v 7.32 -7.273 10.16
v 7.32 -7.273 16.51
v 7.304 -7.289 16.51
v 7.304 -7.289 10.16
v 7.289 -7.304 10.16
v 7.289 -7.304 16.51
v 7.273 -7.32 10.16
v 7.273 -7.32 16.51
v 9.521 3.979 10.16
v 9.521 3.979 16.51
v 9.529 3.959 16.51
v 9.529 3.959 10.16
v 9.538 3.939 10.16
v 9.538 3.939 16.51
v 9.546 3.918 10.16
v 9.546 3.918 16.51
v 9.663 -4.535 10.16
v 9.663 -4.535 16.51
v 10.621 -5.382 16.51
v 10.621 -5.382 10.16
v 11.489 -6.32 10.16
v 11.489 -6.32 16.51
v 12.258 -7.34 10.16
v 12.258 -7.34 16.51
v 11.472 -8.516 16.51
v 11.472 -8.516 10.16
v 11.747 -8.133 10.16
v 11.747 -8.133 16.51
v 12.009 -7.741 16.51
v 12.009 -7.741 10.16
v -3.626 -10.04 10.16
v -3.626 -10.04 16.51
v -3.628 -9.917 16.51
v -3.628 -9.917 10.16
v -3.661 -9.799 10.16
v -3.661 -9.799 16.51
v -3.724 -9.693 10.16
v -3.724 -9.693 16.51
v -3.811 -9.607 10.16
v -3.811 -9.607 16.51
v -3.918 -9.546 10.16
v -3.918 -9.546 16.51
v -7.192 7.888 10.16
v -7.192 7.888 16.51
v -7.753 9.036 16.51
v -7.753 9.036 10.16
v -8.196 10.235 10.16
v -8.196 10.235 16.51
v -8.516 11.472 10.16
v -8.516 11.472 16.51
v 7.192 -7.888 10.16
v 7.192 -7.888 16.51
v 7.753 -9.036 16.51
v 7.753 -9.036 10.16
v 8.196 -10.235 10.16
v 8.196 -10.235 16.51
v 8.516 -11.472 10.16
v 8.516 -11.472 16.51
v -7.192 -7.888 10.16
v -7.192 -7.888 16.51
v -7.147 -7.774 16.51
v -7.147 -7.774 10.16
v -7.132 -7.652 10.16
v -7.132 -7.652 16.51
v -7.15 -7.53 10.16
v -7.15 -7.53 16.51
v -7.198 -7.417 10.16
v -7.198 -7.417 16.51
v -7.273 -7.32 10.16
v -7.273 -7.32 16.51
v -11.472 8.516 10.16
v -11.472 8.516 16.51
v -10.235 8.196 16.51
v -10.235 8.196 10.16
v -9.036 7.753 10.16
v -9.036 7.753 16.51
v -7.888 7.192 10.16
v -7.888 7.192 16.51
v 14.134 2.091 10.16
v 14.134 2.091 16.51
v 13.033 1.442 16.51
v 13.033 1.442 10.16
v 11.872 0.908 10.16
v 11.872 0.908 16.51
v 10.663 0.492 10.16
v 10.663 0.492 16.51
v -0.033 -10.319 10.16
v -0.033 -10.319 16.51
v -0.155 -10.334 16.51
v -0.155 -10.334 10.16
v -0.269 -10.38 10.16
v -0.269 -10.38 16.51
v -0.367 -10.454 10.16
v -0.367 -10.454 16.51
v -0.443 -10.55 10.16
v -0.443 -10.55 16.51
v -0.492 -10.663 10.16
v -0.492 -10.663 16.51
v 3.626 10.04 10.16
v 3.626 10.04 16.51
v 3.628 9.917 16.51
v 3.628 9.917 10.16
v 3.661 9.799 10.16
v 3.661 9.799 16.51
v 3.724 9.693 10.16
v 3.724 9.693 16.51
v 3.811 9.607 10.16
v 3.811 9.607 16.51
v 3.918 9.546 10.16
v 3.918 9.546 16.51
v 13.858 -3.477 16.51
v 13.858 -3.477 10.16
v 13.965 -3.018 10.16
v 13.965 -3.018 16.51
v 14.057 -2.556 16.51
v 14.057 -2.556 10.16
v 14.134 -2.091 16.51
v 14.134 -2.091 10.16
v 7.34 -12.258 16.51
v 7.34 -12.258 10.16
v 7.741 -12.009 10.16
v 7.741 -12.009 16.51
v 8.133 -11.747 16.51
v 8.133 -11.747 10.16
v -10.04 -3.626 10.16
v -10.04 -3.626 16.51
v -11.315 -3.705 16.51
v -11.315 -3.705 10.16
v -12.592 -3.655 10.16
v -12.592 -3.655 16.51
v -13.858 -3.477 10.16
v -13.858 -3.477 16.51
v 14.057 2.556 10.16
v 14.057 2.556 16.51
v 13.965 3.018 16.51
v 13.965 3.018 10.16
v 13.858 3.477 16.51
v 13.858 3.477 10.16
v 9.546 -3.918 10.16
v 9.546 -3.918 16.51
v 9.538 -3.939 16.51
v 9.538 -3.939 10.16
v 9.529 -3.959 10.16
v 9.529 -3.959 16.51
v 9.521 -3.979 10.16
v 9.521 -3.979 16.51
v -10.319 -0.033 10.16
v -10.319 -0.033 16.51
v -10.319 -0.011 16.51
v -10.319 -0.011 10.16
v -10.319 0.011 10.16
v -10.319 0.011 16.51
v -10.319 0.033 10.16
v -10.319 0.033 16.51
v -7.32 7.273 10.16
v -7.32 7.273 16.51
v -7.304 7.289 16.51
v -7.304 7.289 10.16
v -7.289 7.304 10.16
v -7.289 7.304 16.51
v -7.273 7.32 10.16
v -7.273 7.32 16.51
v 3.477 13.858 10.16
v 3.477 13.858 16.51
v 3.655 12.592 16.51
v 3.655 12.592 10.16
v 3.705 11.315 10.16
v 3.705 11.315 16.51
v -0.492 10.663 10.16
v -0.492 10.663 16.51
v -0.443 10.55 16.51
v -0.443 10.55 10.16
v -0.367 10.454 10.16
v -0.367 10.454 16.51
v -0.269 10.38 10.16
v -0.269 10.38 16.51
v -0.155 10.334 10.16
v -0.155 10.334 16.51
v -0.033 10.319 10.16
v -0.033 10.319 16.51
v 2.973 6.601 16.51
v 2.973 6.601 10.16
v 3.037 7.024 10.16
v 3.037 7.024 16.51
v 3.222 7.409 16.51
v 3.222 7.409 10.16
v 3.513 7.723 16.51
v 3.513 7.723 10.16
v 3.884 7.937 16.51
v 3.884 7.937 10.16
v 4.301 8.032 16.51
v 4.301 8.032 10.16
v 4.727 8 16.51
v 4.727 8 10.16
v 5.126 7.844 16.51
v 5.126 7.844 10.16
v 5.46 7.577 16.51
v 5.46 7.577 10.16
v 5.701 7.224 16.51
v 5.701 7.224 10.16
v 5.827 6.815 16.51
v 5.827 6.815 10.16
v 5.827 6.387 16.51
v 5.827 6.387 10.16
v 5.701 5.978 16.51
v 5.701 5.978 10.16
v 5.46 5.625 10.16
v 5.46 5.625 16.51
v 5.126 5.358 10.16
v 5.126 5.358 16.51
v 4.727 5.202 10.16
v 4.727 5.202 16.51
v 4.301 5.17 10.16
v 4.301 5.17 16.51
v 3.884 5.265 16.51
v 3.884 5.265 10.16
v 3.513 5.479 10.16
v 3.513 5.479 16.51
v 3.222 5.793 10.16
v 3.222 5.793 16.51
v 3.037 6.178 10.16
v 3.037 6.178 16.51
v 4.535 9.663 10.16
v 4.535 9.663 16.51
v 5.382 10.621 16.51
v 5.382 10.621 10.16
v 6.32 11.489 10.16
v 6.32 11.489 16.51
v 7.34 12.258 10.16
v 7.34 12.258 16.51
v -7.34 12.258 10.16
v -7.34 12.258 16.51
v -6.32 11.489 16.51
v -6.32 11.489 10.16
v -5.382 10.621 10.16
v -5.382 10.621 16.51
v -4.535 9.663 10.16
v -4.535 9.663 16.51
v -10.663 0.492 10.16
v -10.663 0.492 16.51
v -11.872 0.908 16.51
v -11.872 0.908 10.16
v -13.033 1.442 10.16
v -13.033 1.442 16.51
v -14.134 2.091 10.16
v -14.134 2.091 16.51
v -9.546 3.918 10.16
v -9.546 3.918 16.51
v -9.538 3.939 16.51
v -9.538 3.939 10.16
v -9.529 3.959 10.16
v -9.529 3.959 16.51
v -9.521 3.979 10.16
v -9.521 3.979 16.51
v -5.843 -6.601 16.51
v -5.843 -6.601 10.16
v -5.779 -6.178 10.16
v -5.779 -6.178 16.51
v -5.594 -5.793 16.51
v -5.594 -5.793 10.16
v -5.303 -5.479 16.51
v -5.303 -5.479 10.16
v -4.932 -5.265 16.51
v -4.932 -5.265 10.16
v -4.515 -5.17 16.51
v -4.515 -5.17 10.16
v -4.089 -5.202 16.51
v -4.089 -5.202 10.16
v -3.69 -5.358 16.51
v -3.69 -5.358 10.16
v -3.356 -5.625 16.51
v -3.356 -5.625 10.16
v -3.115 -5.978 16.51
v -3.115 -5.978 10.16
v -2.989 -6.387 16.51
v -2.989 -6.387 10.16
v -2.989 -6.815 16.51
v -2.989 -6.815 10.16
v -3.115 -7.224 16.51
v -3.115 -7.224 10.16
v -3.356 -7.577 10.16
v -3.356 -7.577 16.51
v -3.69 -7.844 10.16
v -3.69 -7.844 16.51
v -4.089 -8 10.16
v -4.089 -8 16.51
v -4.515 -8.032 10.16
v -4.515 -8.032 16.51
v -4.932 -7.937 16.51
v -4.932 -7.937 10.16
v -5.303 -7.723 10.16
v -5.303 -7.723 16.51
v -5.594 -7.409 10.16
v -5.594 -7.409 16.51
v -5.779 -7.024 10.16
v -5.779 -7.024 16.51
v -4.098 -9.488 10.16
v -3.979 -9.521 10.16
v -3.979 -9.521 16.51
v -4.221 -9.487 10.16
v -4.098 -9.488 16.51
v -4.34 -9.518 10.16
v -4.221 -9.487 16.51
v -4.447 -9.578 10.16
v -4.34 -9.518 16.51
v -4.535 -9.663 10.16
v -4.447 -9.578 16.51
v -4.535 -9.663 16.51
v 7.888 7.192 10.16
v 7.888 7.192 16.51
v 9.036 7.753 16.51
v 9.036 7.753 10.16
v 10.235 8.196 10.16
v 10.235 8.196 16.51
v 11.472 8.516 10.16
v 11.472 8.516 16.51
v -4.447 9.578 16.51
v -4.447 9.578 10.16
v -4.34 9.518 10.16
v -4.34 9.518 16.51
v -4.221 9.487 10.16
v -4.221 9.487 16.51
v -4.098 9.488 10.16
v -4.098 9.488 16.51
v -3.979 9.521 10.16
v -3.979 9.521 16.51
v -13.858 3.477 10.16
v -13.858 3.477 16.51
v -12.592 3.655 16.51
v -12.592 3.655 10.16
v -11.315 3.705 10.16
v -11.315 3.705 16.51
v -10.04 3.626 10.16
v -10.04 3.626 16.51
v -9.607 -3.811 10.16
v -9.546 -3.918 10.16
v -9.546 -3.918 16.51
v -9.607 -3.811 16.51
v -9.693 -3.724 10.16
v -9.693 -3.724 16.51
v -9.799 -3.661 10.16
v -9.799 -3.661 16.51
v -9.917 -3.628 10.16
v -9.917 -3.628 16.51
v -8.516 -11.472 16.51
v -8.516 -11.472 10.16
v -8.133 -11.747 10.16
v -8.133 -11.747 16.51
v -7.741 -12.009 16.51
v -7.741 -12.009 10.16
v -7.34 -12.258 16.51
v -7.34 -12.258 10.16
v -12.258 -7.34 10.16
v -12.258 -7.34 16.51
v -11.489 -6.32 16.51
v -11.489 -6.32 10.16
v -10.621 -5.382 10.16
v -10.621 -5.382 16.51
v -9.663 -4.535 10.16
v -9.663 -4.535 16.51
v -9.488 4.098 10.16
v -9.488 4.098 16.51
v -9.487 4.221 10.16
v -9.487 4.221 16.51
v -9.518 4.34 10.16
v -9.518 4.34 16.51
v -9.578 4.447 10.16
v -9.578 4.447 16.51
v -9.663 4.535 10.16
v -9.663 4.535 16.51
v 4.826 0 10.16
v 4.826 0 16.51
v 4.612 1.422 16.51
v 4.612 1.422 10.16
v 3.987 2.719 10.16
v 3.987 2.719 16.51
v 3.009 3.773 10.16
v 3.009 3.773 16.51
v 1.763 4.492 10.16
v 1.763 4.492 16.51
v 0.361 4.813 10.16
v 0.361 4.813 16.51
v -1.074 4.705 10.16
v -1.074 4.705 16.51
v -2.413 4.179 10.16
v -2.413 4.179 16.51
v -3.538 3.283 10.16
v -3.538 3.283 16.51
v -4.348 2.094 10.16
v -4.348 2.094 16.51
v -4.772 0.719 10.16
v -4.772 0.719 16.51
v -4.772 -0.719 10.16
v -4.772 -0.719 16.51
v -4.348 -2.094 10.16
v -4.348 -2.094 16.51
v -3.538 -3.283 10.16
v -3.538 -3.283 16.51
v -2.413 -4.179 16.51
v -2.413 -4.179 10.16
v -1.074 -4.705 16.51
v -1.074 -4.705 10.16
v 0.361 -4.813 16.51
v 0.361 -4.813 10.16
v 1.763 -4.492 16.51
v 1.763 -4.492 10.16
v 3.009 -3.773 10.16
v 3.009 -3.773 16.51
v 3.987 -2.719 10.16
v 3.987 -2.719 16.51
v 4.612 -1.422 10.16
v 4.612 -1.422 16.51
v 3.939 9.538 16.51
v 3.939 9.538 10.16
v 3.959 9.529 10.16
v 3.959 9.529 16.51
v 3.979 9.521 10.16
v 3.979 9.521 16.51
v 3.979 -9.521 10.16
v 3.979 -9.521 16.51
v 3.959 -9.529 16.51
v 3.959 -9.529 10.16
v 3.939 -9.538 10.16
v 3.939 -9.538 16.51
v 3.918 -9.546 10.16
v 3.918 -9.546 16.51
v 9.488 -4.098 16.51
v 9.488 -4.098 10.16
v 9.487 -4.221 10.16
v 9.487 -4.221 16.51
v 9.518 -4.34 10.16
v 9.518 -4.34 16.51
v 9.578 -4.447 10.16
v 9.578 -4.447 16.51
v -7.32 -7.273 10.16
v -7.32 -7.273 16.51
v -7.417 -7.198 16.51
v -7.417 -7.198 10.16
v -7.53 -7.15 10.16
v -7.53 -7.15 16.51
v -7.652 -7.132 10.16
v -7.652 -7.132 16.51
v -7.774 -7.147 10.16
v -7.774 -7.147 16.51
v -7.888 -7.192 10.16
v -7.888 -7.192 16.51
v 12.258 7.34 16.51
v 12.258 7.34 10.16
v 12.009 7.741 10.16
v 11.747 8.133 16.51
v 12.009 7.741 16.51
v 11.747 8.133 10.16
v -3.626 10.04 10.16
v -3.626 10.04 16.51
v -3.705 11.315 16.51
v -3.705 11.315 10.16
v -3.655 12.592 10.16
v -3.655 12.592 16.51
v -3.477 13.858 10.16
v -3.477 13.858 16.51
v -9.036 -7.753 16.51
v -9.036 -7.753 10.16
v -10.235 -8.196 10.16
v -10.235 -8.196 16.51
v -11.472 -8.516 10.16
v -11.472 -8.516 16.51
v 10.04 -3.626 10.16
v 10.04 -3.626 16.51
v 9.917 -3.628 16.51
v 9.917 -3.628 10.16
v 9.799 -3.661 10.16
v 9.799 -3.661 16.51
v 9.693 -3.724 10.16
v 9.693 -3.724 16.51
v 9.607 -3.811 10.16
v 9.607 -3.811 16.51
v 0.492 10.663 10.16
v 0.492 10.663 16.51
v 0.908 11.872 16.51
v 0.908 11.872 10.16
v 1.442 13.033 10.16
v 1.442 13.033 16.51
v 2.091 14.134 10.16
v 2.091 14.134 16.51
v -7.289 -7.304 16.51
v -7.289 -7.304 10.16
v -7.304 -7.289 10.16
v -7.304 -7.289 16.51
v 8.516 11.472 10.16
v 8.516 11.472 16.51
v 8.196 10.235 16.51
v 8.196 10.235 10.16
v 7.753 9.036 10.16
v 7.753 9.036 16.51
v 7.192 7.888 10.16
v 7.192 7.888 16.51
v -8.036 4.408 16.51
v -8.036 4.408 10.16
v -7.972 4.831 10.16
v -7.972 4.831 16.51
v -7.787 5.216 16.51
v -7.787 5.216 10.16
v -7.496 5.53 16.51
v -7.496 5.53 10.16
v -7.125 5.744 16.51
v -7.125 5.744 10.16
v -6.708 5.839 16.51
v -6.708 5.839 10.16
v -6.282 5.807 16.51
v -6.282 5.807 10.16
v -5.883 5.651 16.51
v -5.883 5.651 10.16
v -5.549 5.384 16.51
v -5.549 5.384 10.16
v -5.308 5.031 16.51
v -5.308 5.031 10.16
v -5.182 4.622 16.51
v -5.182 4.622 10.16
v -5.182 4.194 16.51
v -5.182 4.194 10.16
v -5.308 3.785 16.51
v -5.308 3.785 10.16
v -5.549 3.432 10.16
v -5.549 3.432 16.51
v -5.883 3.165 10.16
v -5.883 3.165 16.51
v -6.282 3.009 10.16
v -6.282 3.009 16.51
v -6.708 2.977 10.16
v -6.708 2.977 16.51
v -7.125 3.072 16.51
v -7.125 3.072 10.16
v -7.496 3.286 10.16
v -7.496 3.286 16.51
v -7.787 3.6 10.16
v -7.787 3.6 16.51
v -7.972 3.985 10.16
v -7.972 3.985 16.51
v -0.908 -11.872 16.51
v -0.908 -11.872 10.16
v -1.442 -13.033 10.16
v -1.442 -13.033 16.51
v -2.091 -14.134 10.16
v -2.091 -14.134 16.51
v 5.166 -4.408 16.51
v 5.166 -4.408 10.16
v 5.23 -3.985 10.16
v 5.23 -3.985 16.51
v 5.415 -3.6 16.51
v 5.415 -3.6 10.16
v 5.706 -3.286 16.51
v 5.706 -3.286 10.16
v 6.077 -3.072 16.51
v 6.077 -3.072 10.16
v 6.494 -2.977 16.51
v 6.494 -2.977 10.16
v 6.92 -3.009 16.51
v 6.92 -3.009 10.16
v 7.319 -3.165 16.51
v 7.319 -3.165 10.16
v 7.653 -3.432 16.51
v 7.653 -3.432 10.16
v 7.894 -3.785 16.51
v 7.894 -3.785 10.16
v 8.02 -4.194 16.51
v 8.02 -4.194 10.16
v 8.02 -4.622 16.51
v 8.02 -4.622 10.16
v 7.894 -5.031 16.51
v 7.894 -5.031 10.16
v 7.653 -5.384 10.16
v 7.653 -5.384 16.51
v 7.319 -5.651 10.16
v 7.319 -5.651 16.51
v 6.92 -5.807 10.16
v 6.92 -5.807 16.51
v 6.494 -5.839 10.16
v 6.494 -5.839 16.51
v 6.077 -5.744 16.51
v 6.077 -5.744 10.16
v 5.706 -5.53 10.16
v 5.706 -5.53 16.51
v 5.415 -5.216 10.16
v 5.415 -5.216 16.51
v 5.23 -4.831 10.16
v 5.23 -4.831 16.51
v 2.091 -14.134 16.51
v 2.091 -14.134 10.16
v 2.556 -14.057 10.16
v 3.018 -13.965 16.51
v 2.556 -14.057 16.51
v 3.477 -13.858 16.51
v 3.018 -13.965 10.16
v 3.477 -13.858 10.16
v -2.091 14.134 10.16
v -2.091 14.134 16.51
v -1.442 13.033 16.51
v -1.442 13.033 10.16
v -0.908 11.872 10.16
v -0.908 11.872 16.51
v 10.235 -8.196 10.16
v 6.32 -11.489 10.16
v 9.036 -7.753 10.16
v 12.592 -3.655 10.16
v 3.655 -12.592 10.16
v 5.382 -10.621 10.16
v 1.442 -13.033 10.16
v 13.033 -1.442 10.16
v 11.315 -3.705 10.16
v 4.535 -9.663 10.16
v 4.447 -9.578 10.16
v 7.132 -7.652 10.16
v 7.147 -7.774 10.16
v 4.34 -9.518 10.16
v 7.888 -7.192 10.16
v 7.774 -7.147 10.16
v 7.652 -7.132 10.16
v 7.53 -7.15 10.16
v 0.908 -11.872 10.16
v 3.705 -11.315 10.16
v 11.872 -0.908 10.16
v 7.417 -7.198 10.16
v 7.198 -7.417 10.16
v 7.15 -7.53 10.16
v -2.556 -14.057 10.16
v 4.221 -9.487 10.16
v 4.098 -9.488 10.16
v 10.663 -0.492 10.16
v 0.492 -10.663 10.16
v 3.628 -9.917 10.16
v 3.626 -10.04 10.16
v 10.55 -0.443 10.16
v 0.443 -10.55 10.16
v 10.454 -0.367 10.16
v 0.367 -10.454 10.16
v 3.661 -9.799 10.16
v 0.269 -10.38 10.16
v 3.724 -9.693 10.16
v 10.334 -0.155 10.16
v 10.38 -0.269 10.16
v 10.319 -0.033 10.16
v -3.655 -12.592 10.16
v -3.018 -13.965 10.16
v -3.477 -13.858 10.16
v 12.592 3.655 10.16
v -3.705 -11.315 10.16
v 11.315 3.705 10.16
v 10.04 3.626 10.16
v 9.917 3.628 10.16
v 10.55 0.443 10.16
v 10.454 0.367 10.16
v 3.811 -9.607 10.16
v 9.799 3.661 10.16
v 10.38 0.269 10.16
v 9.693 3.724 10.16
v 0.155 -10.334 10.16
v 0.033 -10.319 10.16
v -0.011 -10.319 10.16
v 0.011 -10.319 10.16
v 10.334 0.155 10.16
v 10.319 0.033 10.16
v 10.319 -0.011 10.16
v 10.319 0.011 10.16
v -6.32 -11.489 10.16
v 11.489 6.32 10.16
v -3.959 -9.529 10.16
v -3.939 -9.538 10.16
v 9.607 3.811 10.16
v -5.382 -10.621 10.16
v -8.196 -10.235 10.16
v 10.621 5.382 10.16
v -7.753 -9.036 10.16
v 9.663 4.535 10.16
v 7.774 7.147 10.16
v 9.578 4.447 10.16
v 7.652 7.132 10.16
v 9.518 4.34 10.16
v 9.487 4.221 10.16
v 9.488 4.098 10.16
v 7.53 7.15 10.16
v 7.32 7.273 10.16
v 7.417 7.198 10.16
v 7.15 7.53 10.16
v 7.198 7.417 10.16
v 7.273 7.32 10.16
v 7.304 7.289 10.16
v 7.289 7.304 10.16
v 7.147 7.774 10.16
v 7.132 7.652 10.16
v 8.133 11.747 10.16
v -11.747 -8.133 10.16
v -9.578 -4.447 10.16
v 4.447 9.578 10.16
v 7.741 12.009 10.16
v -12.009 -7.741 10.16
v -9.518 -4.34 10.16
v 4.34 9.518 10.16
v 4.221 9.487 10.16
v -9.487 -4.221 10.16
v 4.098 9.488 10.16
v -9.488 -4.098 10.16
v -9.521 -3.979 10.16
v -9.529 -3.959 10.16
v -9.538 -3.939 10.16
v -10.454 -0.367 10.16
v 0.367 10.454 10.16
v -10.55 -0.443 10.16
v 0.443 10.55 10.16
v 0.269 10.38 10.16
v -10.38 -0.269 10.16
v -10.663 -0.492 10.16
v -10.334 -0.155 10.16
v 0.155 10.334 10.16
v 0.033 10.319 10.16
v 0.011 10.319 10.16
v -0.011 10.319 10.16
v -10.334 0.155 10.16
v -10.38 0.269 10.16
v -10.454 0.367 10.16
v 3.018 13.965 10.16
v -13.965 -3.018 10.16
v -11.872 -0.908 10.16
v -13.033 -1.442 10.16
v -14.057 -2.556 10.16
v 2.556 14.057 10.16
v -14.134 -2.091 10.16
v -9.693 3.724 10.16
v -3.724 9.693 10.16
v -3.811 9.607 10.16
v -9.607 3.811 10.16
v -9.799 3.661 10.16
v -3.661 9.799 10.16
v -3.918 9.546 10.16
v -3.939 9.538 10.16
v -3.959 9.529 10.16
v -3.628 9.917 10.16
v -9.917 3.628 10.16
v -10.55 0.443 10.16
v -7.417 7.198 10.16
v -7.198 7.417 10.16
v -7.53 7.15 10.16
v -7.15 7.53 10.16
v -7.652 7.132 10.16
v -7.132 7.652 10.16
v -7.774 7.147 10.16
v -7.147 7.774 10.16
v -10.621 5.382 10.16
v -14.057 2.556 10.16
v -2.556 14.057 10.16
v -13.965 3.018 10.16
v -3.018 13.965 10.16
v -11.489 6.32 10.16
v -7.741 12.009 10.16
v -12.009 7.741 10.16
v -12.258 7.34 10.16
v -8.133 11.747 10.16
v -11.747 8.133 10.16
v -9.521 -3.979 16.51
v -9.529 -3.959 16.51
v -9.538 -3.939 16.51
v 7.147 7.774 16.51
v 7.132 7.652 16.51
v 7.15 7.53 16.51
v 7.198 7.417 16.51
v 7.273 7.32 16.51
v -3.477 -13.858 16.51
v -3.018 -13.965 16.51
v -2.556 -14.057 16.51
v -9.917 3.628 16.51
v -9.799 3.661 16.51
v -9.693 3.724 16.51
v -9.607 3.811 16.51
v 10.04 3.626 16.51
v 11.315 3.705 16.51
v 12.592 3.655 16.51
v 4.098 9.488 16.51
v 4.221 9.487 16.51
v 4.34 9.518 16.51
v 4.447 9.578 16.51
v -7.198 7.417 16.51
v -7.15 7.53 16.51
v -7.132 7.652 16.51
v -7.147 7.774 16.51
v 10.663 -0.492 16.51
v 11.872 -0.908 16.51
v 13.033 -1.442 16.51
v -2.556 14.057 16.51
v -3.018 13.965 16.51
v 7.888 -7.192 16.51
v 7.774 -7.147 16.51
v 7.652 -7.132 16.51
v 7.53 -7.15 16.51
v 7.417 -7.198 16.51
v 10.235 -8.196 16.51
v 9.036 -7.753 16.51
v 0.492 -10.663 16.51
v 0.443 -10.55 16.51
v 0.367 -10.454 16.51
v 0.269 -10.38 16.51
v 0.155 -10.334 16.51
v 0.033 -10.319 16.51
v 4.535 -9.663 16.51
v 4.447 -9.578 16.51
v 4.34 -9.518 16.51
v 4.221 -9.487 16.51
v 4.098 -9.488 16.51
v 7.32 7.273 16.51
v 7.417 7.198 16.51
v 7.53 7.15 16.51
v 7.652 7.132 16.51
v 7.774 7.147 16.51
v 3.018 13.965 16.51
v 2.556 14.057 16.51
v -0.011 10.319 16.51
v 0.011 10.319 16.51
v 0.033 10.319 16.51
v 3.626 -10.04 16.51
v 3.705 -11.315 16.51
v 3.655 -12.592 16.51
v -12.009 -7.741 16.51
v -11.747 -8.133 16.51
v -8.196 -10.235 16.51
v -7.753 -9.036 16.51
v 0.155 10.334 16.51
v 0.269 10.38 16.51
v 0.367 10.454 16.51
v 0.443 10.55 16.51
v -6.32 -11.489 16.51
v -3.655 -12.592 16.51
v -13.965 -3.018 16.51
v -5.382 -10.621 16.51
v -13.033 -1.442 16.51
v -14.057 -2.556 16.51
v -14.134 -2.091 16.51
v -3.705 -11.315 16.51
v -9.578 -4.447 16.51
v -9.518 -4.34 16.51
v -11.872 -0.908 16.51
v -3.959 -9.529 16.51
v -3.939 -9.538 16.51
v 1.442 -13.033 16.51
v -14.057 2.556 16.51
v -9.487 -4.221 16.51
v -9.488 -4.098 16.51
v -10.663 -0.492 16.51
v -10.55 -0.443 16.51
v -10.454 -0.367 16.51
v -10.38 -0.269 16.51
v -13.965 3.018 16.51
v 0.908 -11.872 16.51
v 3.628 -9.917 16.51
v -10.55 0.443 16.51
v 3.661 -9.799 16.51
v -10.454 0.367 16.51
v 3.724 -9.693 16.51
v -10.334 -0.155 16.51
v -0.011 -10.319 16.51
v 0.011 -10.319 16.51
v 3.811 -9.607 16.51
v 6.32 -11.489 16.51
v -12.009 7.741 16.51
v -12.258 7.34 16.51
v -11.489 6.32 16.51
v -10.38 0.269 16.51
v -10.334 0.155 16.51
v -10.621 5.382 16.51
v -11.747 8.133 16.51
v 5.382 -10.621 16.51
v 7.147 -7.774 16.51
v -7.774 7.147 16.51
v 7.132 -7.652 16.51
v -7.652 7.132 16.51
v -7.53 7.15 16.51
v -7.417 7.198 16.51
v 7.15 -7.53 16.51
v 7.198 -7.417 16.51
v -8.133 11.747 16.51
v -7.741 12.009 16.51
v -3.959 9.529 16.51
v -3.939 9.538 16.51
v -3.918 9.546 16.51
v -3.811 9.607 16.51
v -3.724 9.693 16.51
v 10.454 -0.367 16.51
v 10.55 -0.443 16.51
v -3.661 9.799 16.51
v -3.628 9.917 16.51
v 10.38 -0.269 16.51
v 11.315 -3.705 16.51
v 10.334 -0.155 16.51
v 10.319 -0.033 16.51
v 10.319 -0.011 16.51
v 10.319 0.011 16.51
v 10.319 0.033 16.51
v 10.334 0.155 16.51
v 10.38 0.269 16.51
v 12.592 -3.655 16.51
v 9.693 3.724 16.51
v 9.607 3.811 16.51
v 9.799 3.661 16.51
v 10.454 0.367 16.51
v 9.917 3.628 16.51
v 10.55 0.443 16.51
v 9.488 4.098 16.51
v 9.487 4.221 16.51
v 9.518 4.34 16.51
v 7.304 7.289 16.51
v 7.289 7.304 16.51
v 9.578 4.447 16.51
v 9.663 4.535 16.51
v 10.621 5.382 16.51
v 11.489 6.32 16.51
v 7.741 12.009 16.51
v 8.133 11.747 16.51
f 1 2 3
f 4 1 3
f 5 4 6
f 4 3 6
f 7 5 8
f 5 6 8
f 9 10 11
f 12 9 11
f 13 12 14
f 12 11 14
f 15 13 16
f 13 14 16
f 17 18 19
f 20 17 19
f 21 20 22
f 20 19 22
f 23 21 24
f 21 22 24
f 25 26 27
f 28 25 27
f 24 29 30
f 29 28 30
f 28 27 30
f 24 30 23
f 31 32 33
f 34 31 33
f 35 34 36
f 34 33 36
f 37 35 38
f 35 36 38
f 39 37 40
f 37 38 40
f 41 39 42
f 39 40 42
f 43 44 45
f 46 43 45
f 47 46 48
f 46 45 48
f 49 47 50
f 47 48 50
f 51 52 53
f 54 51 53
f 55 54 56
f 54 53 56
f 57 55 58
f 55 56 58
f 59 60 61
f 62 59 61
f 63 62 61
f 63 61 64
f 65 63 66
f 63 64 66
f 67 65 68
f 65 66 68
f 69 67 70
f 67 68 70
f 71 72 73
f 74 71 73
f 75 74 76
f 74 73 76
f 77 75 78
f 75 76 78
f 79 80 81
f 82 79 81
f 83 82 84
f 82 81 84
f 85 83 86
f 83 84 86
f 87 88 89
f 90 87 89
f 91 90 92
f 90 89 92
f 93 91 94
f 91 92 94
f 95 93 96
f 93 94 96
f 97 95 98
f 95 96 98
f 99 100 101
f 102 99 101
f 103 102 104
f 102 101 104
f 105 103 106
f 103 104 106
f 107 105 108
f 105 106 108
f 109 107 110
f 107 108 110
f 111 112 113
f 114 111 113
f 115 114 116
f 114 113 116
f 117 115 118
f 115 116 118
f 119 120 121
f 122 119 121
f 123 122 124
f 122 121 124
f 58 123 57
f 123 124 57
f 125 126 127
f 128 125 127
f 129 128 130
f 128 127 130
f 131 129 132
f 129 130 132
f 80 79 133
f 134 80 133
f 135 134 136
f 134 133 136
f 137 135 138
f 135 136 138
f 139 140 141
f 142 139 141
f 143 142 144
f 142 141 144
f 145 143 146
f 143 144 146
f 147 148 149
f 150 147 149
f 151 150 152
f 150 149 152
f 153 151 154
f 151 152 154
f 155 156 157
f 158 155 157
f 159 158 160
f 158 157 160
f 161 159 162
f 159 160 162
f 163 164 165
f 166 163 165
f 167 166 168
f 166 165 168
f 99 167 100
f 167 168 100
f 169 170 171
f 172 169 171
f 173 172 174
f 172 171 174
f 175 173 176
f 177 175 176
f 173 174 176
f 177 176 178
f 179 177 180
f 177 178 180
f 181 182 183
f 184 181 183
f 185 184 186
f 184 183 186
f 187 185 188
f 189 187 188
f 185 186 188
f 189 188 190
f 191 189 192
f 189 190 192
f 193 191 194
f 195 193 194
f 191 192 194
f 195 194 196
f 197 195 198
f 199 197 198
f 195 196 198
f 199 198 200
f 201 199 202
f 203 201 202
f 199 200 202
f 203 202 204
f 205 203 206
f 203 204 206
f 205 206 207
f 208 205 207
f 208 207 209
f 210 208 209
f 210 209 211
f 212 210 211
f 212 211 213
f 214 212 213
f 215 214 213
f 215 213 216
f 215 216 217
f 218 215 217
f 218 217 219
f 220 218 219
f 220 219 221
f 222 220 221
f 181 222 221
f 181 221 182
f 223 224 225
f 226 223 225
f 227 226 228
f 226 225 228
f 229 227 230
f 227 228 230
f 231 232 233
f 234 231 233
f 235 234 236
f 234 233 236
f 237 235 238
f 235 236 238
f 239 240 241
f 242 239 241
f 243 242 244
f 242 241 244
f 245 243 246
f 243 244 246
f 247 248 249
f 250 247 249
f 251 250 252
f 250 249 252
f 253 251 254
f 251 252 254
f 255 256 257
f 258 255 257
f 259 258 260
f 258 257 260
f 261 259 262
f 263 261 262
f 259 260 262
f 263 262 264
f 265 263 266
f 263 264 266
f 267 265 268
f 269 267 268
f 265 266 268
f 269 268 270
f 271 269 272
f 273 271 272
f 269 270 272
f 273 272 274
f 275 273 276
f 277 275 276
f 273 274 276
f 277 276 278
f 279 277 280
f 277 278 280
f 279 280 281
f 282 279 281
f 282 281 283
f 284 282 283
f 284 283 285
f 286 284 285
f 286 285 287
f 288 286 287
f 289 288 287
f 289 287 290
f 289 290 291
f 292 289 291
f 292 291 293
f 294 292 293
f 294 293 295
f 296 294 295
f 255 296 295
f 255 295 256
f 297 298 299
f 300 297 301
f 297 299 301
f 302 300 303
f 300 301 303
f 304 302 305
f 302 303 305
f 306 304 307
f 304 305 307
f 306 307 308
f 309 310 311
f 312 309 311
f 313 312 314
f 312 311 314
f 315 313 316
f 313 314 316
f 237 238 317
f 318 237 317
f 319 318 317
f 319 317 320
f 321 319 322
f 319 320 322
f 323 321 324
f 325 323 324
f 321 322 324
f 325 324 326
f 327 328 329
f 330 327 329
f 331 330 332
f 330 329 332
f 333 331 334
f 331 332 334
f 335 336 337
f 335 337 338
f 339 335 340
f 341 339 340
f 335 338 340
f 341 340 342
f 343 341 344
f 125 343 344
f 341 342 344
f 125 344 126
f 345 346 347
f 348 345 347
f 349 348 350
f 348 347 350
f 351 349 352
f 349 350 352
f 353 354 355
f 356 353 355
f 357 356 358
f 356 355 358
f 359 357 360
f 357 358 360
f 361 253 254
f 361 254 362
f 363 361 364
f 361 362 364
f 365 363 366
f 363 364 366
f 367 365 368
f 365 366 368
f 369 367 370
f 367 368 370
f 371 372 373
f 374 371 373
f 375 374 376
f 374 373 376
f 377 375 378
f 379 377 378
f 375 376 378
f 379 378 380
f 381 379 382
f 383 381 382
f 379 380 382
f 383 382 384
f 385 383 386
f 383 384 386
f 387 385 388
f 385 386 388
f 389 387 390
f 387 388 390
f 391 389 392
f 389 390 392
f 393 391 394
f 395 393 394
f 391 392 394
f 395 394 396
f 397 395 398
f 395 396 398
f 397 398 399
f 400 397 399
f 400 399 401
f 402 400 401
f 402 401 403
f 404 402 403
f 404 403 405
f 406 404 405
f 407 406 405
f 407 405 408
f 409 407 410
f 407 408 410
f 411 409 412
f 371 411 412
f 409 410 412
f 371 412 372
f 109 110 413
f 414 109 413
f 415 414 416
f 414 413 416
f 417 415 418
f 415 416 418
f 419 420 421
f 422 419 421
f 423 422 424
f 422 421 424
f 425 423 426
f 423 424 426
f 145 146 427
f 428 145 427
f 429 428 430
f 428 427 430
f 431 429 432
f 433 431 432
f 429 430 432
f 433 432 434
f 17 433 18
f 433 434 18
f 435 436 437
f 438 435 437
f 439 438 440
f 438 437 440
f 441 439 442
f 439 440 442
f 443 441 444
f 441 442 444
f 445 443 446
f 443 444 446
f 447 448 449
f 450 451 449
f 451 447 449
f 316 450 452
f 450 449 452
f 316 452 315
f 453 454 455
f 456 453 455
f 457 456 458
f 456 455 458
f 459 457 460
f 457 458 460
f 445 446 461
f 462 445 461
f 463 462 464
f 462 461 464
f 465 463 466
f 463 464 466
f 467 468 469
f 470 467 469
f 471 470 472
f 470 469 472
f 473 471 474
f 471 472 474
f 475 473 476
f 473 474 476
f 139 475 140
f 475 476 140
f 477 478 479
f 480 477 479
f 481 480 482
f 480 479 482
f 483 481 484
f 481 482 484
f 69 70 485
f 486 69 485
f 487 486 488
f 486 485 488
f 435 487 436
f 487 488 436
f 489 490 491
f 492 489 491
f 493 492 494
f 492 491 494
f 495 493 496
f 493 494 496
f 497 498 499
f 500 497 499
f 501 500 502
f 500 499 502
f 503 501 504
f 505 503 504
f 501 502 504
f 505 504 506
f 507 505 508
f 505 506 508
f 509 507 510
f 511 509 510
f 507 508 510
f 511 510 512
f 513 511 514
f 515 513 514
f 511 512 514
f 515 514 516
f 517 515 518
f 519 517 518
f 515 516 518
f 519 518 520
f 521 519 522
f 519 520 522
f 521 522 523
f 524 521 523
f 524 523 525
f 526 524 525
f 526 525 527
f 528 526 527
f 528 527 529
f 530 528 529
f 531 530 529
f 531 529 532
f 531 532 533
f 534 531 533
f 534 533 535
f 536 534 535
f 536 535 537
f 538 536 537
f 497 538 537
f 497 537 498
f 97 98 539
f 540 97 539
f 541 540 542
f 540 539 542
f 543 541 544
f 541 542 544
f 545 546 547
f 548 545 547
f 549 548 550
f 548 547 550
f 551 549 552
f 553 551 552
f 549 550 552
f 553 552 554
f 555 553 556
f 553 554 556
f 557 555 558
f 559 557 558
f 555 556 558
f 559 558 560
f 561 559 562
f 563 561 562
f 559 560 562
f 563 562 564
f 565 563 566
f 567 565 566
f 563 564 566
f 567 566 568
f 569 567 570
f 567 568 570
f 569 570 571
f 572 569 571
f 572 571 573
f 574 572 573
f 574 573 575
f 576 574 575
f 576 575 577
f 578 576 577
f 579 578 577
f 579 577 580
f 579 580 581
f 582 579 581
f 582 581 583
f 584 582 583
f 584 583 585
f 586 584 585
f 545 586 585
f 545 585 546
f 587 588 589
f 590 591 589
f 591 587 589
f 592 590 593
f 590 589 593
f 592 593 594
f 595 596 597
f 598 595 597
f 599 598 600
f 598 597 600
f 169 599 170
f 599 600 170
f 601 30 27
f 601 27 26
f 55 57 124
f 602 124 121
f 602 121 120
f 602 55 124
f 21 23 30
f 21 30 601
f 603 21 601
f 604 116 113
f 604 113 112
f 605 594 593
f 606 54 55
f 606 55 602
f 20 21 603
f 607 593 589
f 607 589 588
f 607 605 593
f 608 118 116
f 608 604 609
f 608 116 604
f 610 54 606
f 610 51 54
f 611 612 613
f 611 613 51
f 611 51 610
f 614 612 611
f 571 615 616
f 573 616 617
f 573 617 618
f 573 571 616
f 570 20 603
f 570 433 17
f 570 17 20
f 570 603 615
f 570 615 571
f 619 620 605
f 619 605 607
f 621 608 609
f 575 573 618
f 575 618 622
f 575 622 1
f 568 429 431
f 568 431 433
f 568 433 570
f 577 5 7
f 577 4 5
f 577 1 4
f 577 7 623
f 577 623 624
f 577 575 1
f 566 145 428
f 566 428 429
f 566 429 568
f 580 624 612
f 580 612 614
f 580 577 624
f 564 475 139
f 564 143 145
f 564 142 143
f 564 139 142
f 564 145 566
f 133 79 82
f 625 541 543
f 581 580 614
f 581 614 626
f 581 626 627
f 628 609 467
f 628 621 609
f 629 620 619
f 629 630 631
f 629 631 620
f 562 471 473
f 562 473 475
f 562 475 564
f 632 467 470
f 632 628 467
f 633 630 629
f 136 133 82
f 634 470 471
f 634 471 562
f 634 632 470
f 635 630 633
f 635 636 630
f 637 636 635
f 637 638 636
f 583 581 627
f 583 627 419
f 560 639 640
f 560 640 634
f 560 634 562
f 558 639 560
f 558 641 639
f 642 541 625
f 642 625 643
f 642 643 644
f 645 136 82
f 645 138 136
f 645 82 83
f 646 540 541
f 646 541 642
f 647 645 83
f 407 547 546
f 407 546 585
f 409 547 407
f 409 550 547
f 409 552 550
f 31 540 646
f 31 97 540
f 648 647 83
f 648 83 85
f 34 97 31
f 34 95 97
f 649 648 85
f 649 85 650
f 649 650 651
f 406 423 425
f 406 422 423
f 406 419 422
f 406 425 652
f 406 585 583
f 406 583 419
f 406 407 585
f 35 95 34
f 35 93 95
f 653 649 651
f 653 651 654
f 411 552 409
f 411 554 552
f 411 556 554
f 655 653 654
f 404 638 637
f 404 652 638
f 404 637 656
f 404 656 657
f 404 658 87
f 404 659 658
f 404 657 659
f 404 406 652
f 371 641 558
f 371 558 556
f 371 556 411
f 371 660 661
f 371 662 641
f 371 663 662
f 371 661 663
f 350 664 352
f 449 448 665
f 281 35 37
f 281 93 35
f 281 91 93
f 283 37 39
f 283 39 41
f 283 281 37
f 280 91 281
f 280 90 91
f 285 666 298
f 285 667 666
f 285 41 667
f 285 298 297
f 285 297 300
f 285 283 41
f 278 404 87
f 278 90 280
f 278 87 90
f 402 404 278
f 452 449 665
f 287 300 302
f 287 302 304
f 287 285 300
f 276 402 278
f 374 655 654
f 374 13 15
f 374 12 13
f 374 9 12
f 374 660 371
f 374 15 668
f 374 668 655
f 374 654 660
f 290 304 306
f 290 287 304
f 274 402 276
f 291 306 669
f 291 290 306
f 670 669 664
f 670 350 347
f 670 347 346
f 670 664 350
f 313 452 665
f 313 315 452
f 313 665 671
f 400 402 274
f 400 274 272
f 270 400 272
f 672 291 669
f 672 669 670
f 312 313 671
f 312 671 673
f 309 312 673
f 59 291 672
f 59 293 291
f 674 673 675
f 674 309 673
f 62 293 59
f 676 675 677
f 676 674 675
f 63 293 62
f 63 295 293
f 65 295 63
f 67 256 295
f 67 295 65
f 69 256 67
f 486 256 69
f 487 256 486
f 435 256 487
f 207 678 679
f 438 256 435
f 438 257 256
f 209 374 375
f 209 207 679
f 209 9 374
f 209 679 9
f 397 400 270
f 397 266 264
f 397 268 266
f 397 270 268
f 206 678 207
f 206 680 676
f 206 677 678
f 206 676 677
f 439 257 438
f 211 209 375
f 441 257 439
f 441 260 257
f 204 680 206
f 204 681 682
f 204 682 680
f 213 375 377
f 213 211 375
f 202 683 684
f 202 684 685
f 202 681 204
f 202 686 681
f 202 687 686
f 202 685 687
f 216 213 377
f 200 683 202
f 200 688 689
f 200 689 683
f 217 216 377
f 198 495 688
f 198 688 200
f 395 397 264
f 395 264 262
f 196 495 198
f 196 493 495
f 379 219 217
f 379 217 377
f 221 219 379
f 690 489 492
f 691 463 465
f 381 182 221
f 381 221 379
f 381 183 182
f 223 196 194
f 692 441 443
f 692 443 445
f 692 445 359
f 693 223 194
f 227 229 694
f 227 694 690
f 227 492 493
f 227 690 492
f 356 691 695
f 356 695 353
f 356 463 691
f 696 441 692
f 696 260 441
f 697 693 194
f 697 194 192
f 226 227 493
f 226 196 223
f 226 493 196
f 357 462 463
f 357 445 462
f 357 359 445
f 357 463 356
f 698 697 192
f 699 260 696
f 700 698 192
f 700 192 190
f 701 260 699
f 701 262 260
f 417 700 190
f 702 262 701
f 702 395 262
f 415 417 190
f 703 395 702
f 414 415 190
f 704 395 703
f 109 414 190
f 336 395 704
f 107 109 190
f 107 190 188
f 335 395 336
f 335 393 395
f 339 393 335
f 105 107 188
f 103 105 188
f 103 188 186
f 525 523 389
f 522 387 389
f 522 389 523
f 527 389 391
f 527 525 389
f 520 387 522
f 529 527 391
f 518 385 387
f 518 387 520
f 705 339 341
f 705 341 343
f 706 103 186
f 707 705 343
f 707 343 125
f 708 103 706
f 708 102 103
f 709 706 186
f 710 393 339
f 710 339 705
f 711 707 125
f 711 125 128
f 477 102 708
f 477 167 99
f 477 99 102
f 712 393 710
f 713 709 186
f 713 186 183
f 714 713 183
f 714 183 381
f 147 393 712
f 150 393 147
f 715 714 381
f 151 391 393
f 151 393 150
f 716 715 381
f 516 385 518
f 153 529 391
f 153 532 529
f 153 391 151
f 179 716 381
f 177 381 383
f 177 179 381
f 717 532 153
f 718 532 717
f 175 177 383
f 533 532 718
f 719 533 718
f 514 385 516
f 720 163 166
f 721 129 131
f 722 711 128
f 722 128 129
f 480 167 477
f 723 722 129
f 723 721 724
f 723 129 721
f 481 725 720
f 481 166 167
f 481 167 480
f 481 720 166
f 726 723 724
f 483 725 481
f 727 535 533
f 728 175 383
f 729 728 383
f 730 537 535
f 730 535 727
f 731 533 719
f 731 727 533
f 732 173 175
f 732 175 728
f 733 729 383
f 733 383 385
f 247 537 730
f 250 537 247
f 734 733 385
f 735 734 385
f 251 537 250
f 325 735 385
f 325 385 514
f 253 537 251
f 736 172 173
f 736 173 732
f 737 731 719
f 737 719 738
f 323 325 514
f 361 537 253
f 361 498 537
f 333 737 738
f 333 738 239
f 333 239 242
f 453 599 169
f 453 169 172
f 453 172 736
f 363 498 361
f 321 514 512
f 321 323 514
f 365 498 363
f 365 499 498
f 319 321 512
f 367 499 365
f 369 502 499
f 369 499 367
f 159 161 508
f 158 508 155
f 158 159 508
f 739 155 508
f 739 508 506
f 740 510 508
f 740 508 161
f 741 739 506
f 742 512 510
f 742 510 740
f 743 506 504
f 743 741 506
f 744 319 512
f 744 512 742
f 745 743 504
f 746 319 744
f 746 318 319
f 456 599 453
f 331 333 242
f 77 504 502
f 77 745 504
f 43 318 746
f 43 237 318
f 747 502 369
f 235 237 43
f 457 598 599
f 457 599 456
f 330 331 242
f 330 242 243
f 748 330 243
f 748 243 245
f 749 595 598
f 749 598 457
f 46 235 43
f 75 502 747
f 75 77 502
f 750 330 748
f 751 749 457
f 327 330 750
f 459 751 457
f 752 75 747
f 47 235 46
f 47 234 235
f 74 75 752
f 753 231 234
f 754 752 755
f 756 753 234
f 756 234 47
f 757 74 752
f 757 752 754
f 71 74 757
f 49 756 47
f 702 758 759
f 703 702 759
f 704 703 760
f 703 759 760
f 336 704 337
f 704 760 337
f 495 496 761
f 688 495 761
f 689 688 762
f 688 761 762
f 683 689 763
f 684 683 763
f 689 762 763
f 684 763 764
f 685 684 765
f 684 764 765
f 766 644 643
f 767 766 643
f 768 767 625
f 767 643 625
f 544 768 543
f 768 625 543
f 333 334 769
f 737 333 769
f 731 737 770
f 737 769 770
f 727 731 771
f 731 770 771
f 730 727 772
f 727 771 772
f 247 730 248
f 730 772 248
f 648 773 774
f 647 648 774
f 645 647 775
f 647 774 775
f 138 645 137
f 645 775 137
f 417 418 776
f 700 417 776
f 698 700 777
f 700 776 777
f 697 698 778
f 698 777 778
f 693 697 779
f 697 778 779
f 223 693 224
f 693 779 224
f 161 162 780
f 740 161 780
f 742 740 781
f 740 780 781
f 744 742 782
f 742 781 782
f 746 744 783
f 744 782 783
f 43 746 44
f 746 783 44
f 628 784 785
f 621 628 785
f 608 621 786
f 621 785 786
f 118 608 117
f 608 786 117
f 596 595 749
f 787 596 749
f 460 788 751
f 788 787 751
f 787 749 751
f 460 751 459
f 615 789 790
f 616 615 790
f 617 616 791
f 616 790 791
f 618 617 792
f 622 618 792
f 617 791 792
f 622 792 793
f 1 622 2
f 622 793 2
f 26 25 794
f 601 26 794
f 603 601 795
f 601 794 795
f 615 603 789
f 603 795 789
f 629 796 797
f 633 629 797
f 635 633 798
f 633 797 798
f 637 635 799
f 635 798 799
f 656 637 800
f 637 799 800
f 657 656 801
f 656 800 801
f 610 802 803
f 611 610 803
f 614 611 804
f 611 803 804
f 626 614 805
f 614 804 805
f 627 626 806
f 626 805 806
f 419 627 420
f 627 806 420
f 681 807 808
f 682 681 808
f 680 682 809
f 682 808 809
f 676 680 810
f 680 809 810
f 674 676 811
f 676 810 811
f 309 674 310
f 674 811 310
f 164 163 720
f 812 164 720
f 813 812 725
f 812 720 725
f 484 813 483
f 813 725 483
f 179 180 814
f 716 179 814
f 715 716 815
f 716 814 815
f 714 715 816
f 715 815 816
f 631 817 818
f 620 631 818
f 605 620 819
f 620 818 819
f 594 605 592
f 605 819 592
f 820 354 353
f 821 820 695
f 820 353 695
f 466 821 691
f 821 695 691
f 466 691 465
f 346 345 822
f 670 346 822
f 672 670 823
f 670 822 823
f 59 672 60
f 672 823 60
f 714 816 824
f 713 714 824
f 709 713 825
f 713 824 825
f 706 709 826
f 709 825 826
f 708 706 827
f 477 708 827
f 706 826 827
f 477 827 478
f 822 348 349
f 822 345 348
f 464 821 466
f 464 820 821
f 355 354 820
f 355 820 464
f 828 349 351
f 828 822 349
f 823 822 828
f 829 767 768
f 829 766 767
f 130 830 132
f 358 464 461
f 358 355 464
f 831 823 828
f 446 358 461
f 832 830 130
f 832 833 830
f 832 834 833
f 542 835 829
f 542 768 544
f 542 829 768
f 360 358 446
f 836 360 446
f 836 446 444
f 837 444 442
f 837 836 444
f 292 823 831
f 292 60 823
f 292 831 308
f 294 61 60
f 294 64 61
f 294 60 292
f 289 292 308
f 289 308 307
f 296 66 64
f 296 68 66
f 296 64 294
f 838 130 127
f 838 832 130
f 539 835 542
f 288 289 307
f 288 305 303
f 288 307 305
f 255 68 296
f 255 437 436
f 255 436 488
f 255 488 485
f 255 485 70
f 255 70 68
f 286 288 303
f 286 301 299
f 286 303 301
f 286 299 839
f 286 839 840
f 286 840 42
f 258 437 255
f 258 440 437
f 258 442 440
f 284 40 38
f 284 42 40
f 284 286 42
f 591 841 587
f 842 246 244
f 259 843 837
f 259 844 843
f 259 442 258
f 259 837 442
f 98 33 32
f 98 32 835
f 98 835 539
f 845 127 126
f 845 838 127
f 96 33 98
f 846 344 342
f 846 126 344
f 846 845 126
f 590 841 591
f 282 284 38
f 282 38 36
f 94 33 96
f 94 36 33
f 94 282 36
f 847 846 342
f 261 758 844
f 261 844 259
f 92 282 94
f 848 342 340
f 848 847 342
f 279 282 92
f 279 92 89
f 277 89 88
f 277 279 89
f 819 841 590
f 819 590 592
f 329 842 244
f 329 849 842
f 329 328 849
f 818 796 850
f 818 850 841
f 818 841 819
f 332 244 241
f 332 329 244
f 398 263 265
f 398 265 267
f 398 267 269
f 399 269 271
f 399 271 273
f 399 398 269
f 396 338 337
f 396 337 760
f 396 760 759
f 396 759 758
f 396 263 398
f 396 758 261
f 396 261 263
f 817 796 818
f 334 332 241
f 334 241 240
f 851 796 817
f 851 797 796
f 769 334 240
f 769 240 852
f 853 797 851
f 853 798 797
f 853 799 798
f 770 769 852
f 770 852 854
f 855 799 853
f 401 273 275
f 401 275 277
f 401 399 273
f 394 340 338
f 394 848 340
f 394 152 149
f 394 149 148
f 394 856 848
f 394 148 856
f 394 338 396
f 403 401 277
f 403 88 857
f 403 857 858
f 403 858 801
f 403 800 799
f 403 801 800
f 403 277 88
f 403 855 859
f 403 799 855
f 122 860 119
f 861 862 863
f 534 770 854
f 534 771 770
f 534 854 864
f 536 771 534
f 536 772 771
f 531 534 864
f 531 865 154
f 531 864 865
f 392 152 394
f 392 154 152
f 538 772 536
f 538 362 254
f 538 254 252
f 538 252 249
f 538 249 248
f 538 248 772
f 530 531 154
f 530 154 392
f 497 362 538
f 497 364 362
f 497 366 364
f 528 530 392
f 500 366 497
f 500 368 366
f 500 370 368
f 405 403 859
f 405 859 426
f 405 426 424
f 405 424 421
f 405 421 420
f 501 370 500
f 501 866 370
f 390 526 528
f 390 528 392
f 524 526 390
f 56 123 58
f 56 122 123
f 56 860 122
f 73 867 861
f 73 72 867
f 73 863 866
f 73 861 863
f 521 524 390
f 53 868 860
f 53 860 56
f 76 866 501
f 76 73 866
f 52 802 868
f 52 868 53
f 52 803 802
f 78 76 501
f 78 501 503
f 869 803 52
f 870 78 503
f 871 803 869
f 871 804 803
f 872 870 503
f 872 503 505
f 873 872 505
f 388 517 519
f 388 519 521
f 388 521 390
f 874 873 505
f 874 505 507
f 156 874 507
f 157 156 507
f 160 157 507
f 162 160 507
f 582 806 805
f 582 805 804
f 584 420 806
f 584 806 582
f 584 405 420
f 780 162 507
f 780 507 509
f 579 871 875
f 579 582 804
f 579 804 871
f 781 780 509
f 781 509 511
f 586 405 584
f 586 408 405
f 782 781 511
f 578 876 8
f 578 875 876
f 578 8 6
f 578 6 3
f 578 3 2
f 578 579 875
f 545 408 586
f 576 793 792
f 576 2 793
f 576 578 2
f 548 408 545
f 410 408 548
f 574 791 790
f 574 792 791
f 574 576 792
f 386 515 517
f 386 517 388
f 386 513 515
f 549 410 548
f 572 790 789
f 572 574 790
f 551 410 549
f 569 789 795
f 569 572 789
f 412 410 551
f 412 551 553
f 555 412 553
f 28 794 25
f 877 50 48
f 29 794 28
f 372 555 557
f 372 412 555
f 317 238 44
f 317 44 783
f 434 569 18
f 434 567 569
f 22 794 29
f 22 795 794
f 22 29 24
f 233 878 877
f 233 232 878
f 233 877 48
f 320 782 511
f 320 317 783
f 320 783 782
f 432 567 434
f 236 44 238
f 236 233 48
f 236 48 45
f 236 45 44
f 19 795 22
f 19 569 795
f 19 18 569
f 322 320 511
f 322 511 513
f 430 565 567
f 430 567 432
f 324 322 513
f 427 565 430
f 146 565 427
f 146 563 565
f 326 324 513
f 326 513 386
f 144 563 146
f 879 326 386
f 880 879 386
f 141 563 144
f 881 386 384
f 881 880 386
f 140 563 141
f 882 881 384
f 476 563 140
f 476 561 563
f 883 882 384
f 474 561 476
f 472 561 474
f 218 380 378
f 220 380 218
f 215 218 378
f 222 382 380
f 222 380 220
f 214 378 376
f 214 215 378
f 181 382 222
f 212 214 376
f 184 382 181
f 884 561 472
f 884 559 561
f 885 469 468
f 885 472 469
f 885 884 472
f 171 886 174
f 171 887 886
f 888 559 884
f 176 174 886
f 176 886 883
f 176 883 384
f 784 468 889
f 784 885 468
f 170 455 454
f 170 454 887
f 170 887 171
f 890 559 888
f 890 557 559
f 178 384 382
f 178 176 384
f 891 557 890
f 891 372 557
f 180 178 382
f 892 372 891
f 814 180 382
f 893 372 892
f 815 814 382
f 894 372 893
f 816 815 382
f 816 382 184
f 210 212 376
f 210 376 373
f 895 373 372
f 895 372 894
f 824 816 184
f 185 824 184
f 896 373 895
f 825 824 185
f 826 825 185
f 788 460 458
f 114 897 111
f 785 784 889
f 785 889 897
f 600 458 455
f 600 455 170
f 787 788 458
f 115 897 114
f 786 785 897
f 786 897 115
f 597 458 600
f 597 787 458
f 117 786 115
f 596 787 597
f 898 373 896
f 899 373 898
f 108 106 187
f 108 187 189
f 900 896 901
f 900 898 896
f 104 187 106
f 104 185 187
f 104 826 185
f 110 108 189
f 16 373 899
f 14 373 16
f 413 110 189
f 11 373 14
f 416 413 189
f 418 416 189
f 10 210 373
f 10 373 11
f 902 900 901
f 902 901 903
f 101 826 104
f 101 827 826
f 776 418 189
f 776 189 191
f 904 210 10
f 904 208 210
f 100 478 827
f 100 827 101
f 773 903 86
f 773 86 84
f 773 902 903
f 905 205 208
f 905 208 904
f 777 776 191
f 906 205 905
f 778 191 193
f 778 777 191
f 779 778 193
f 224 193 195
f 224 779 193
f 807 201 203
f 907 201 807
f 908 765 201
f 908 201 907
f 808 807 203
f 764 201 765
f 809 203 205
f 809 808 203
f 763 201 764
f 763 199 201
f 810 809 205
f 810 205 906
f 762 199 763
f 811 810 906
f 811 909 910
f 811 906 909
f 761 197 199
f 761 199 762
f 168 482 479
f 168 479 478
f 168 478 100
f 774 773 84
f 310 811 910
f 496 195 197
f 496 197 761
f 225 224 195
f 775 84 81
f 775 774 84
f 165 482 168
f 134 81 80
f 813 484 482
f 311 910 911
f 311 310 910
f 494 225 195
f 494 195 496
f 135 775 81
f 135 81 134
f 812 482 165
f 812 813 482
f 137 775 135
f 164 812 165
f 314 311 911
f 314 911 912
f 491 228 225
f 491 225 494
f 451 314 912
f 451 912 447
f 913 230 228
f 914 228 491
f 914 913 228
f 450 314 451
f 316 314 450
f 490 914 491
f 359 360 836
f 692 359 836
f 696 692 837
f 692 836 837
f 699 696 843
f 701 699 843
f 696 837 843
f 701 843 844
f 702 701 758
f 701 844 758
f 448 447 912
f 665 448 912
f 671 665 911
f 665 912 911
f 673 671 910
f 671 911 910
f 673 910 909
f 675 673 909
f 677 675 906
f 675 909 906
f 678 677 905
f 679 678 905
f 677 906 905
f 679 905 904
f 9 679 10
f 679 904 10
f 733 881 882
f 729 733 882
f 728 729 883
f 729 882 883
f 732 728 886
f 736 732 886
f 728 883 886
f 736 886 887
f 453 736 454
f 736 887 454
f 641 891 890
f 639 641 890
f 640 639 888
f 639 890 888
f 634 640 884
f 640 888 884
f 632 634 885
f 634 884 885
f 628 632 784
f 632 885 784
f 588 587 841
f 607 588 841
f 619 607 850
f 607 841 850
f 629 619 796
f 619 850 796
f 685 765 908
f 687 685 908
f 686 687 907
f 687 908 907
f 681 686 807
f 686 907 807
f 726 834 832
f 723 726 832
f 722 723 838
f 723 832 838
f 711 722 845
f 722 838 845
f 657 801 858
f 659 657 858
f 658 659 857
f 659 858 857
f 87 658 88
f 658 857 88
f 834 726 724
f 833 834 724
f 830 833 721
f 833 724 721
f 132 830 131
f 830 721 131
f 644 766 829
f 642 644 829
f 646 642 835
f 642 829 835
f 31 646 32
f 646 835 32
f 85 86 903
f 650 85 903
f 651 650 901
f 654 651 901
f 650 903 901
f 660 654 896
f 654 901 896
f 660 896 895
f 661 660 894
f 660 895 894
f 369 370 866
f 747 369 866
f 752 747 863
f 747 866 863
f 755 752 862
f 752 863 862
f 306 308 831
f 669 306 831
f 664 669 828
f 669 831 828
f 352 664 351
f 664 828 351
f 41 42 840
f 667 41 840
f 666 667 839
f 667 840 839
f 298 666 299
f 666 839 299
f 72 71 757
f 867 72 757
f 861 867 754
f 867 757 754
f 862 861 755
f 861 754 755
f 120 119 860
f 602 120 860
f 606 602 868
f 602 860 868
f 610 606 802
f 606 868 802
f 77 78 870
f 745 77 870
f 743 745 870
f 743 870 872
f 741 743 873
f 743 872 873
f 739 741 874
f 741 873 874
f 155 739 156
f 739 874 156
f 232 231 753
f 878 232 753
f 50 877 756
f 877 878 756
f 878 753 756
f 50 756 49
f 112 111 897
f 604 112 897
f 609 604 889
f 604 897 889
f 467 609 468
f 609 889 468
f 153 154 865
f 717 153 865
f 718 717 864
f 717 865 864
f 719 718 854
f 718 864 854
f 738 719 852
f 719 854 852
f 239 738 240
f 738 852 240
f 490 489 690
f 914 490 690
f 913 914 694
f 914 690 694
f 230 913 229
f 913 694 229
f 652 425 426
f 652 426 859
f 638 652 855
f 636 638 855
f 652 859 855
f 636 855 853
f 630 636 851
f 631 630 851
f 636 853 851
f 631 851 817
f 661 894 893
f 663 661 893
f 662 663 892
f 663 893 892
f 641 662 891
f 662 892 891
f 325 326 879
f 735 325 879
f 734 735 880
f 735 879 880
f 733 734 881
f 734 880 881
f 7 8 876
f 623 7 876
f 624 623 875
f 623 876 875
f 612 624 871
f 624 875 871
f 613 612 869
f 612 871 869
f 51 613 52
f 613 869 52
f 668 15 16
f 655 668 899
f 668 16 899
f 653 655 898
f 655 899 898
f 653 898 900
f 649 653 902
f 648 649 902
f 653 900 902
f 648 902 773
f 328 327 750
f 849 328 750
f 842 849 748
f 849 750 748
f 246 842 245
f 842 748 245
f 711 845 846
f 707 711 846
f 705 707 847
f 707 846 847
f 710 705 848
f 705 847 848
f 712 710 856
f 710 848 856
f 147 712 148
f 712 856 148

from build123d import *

# Parameters (mm, degrees)
FILLET2_R           = 0.28575
CUT_EXTRUDE2_DEPTH  = 20.05
CIRPATTERN1_COUNT   = 16
SKETCH10_R          = 29.093421686
CUT_EXTRUDE3_DEPTH  = 15.24
SKETCH11_R          = 20.555223038
CUT_EXTRUDE4_DEPTH  = 10.16
SKETCH12_R          = 7.917123479
SKETCH12_R_2        = 4.826
BOSS_EXTRUDE1_DEPTH = 6.35
SKETCH_1_R          = 1.4351
CUT_EXTRUDE_1_DEPTH = 17.51


with BuildPart() as part:
    # Sketch4 → Revolve1 (revolve)
    with BuildSketch(Plane(origin=(0, 0, 0), x_dir=(0, 0, -1), z_dir=(1, 0, 0))):
        Polygon((-31.75, 6.35), (-31.75, 10.3251), (-19.05, 10.3251), (-19.05, 14.2875), (0, 14.2875), (0, 6.35), align=None)
    revolve(axis=Axis((0, 0, 19.05), (0, 0, 1)))

    # Fillet2
    fillet2_edges = [part.edges().sort_by_distance(p)[0] for p in [
        (0, -14.2875, 0),
        (0, -14.2875, 19.05),
        (0, -10.3251, 19.05),
        (0, -10.3251, 31.75),
    ]]
    fillet(fillet2_edges, radius=FILLET2_R)

    # Sketch7 → Cut-Extrude2 (cut, through all)
    with BuildSketch(Plane.XY.offset(19.05)):
        with BuildLine():
            ThreePointArc((-0.033120764, 10.318696845), (0, 10.31875), (0.033120764, 10.318696845))
            ThreePointArc((0.033120764, 10.318696845), (0.320422165, 10.413952701), (0.492309784, 10.663092059))
            ThreePointArc((0.492309784, 10.663092059), (1.160210792, 12.458856869), (2.090652449, 14.133712484))
            ThreePointArc((2.090652449, 14.133712484), (0, 14.2875), (-2.090652449, 14.133712484))
            ThreePointArc((-2.090652449, 14.133712484), (-1.160210792, 12.458856869), (-0.492309784, 10.663092059))
            ThreePointArc((-0.492309784, 10.663092059), (-0.320422165, 10.413952701), (-0.033120764, 10.318696845))
        make_face()
    cut_extrude2 = extrude(amount=-CUT_EXTRUDE2_DEPTH, mode=Mode.SUBTRACT)

    # CirPattern1: Cut-Extrude2 ×16 about axis
    cirpattern1_axis = Axis((0, 0, 0), (0, 0, 1))
    for i in range(1, CIRPATTERN1_COUNT):
        add(cut_extrude2.rotate(cirpattern1_axis, i * 360 / CIRPATTERN1_COUNT), mode=Mode.SUBTRACT)

    # Sketch10 → Cut-Extrude3 (cut)
    with BuildSketch(Plane.XY.offset(31.75)):
        Circle(SKETCH10_R)
    extrude(amount=-CUT_EXTRUDE3_DEPTH, mode=Mode.SUBTRACT)

    # Sketch11 → Cut-Extrude4 (cut)
    with BuildSketch(Plane(origin=(0, 0, 0), x_dir=(-1, 0, 0), z_dir=(0, 0, -1))):
        Circle(SKETCH11_R)
    extrude(amount=-CUT_EXTRUDE4_DEPTH, mode=Mode.SUBTRACT)

    # Sketch12 → Boss-Extrude1 (add)
    with BuildSketch(Plane.XY.offset(16.51)):
        Circle(SKETCH12_R)
        Circle(SKETCH12_R_2, mode=Mode.SUBTRACT)
    extrude(amount=-BOSS_EXTRUDE1_DEPTH)

    # Эскиз1 → Вырез-Вытянуть1 (cut, through all)
    with BuildSketch(Plane(origin=(0, 0, 0), x_dir=(-1, 0, 0), z_dir=(0, 0, -1))):
        with Locations((6.601034981, 4.40797498)):
            Circle(SKETCH_1_R)
        with Locations((4.40797498, -6.601034981)):
            Circle(SKETCH_1_R)
        with Locations((-6.601034981, -4.40797498)):
            Circle(SKETCH_1_R)
        with Locations((-4.40797498, 6.601034981)):
            Circle(SKETCH_1_R)
    extrude(amount=-CUT_EXTRUDE_1_DEPTH, mode=Mode.SUBTRACT)


solid = part.part
